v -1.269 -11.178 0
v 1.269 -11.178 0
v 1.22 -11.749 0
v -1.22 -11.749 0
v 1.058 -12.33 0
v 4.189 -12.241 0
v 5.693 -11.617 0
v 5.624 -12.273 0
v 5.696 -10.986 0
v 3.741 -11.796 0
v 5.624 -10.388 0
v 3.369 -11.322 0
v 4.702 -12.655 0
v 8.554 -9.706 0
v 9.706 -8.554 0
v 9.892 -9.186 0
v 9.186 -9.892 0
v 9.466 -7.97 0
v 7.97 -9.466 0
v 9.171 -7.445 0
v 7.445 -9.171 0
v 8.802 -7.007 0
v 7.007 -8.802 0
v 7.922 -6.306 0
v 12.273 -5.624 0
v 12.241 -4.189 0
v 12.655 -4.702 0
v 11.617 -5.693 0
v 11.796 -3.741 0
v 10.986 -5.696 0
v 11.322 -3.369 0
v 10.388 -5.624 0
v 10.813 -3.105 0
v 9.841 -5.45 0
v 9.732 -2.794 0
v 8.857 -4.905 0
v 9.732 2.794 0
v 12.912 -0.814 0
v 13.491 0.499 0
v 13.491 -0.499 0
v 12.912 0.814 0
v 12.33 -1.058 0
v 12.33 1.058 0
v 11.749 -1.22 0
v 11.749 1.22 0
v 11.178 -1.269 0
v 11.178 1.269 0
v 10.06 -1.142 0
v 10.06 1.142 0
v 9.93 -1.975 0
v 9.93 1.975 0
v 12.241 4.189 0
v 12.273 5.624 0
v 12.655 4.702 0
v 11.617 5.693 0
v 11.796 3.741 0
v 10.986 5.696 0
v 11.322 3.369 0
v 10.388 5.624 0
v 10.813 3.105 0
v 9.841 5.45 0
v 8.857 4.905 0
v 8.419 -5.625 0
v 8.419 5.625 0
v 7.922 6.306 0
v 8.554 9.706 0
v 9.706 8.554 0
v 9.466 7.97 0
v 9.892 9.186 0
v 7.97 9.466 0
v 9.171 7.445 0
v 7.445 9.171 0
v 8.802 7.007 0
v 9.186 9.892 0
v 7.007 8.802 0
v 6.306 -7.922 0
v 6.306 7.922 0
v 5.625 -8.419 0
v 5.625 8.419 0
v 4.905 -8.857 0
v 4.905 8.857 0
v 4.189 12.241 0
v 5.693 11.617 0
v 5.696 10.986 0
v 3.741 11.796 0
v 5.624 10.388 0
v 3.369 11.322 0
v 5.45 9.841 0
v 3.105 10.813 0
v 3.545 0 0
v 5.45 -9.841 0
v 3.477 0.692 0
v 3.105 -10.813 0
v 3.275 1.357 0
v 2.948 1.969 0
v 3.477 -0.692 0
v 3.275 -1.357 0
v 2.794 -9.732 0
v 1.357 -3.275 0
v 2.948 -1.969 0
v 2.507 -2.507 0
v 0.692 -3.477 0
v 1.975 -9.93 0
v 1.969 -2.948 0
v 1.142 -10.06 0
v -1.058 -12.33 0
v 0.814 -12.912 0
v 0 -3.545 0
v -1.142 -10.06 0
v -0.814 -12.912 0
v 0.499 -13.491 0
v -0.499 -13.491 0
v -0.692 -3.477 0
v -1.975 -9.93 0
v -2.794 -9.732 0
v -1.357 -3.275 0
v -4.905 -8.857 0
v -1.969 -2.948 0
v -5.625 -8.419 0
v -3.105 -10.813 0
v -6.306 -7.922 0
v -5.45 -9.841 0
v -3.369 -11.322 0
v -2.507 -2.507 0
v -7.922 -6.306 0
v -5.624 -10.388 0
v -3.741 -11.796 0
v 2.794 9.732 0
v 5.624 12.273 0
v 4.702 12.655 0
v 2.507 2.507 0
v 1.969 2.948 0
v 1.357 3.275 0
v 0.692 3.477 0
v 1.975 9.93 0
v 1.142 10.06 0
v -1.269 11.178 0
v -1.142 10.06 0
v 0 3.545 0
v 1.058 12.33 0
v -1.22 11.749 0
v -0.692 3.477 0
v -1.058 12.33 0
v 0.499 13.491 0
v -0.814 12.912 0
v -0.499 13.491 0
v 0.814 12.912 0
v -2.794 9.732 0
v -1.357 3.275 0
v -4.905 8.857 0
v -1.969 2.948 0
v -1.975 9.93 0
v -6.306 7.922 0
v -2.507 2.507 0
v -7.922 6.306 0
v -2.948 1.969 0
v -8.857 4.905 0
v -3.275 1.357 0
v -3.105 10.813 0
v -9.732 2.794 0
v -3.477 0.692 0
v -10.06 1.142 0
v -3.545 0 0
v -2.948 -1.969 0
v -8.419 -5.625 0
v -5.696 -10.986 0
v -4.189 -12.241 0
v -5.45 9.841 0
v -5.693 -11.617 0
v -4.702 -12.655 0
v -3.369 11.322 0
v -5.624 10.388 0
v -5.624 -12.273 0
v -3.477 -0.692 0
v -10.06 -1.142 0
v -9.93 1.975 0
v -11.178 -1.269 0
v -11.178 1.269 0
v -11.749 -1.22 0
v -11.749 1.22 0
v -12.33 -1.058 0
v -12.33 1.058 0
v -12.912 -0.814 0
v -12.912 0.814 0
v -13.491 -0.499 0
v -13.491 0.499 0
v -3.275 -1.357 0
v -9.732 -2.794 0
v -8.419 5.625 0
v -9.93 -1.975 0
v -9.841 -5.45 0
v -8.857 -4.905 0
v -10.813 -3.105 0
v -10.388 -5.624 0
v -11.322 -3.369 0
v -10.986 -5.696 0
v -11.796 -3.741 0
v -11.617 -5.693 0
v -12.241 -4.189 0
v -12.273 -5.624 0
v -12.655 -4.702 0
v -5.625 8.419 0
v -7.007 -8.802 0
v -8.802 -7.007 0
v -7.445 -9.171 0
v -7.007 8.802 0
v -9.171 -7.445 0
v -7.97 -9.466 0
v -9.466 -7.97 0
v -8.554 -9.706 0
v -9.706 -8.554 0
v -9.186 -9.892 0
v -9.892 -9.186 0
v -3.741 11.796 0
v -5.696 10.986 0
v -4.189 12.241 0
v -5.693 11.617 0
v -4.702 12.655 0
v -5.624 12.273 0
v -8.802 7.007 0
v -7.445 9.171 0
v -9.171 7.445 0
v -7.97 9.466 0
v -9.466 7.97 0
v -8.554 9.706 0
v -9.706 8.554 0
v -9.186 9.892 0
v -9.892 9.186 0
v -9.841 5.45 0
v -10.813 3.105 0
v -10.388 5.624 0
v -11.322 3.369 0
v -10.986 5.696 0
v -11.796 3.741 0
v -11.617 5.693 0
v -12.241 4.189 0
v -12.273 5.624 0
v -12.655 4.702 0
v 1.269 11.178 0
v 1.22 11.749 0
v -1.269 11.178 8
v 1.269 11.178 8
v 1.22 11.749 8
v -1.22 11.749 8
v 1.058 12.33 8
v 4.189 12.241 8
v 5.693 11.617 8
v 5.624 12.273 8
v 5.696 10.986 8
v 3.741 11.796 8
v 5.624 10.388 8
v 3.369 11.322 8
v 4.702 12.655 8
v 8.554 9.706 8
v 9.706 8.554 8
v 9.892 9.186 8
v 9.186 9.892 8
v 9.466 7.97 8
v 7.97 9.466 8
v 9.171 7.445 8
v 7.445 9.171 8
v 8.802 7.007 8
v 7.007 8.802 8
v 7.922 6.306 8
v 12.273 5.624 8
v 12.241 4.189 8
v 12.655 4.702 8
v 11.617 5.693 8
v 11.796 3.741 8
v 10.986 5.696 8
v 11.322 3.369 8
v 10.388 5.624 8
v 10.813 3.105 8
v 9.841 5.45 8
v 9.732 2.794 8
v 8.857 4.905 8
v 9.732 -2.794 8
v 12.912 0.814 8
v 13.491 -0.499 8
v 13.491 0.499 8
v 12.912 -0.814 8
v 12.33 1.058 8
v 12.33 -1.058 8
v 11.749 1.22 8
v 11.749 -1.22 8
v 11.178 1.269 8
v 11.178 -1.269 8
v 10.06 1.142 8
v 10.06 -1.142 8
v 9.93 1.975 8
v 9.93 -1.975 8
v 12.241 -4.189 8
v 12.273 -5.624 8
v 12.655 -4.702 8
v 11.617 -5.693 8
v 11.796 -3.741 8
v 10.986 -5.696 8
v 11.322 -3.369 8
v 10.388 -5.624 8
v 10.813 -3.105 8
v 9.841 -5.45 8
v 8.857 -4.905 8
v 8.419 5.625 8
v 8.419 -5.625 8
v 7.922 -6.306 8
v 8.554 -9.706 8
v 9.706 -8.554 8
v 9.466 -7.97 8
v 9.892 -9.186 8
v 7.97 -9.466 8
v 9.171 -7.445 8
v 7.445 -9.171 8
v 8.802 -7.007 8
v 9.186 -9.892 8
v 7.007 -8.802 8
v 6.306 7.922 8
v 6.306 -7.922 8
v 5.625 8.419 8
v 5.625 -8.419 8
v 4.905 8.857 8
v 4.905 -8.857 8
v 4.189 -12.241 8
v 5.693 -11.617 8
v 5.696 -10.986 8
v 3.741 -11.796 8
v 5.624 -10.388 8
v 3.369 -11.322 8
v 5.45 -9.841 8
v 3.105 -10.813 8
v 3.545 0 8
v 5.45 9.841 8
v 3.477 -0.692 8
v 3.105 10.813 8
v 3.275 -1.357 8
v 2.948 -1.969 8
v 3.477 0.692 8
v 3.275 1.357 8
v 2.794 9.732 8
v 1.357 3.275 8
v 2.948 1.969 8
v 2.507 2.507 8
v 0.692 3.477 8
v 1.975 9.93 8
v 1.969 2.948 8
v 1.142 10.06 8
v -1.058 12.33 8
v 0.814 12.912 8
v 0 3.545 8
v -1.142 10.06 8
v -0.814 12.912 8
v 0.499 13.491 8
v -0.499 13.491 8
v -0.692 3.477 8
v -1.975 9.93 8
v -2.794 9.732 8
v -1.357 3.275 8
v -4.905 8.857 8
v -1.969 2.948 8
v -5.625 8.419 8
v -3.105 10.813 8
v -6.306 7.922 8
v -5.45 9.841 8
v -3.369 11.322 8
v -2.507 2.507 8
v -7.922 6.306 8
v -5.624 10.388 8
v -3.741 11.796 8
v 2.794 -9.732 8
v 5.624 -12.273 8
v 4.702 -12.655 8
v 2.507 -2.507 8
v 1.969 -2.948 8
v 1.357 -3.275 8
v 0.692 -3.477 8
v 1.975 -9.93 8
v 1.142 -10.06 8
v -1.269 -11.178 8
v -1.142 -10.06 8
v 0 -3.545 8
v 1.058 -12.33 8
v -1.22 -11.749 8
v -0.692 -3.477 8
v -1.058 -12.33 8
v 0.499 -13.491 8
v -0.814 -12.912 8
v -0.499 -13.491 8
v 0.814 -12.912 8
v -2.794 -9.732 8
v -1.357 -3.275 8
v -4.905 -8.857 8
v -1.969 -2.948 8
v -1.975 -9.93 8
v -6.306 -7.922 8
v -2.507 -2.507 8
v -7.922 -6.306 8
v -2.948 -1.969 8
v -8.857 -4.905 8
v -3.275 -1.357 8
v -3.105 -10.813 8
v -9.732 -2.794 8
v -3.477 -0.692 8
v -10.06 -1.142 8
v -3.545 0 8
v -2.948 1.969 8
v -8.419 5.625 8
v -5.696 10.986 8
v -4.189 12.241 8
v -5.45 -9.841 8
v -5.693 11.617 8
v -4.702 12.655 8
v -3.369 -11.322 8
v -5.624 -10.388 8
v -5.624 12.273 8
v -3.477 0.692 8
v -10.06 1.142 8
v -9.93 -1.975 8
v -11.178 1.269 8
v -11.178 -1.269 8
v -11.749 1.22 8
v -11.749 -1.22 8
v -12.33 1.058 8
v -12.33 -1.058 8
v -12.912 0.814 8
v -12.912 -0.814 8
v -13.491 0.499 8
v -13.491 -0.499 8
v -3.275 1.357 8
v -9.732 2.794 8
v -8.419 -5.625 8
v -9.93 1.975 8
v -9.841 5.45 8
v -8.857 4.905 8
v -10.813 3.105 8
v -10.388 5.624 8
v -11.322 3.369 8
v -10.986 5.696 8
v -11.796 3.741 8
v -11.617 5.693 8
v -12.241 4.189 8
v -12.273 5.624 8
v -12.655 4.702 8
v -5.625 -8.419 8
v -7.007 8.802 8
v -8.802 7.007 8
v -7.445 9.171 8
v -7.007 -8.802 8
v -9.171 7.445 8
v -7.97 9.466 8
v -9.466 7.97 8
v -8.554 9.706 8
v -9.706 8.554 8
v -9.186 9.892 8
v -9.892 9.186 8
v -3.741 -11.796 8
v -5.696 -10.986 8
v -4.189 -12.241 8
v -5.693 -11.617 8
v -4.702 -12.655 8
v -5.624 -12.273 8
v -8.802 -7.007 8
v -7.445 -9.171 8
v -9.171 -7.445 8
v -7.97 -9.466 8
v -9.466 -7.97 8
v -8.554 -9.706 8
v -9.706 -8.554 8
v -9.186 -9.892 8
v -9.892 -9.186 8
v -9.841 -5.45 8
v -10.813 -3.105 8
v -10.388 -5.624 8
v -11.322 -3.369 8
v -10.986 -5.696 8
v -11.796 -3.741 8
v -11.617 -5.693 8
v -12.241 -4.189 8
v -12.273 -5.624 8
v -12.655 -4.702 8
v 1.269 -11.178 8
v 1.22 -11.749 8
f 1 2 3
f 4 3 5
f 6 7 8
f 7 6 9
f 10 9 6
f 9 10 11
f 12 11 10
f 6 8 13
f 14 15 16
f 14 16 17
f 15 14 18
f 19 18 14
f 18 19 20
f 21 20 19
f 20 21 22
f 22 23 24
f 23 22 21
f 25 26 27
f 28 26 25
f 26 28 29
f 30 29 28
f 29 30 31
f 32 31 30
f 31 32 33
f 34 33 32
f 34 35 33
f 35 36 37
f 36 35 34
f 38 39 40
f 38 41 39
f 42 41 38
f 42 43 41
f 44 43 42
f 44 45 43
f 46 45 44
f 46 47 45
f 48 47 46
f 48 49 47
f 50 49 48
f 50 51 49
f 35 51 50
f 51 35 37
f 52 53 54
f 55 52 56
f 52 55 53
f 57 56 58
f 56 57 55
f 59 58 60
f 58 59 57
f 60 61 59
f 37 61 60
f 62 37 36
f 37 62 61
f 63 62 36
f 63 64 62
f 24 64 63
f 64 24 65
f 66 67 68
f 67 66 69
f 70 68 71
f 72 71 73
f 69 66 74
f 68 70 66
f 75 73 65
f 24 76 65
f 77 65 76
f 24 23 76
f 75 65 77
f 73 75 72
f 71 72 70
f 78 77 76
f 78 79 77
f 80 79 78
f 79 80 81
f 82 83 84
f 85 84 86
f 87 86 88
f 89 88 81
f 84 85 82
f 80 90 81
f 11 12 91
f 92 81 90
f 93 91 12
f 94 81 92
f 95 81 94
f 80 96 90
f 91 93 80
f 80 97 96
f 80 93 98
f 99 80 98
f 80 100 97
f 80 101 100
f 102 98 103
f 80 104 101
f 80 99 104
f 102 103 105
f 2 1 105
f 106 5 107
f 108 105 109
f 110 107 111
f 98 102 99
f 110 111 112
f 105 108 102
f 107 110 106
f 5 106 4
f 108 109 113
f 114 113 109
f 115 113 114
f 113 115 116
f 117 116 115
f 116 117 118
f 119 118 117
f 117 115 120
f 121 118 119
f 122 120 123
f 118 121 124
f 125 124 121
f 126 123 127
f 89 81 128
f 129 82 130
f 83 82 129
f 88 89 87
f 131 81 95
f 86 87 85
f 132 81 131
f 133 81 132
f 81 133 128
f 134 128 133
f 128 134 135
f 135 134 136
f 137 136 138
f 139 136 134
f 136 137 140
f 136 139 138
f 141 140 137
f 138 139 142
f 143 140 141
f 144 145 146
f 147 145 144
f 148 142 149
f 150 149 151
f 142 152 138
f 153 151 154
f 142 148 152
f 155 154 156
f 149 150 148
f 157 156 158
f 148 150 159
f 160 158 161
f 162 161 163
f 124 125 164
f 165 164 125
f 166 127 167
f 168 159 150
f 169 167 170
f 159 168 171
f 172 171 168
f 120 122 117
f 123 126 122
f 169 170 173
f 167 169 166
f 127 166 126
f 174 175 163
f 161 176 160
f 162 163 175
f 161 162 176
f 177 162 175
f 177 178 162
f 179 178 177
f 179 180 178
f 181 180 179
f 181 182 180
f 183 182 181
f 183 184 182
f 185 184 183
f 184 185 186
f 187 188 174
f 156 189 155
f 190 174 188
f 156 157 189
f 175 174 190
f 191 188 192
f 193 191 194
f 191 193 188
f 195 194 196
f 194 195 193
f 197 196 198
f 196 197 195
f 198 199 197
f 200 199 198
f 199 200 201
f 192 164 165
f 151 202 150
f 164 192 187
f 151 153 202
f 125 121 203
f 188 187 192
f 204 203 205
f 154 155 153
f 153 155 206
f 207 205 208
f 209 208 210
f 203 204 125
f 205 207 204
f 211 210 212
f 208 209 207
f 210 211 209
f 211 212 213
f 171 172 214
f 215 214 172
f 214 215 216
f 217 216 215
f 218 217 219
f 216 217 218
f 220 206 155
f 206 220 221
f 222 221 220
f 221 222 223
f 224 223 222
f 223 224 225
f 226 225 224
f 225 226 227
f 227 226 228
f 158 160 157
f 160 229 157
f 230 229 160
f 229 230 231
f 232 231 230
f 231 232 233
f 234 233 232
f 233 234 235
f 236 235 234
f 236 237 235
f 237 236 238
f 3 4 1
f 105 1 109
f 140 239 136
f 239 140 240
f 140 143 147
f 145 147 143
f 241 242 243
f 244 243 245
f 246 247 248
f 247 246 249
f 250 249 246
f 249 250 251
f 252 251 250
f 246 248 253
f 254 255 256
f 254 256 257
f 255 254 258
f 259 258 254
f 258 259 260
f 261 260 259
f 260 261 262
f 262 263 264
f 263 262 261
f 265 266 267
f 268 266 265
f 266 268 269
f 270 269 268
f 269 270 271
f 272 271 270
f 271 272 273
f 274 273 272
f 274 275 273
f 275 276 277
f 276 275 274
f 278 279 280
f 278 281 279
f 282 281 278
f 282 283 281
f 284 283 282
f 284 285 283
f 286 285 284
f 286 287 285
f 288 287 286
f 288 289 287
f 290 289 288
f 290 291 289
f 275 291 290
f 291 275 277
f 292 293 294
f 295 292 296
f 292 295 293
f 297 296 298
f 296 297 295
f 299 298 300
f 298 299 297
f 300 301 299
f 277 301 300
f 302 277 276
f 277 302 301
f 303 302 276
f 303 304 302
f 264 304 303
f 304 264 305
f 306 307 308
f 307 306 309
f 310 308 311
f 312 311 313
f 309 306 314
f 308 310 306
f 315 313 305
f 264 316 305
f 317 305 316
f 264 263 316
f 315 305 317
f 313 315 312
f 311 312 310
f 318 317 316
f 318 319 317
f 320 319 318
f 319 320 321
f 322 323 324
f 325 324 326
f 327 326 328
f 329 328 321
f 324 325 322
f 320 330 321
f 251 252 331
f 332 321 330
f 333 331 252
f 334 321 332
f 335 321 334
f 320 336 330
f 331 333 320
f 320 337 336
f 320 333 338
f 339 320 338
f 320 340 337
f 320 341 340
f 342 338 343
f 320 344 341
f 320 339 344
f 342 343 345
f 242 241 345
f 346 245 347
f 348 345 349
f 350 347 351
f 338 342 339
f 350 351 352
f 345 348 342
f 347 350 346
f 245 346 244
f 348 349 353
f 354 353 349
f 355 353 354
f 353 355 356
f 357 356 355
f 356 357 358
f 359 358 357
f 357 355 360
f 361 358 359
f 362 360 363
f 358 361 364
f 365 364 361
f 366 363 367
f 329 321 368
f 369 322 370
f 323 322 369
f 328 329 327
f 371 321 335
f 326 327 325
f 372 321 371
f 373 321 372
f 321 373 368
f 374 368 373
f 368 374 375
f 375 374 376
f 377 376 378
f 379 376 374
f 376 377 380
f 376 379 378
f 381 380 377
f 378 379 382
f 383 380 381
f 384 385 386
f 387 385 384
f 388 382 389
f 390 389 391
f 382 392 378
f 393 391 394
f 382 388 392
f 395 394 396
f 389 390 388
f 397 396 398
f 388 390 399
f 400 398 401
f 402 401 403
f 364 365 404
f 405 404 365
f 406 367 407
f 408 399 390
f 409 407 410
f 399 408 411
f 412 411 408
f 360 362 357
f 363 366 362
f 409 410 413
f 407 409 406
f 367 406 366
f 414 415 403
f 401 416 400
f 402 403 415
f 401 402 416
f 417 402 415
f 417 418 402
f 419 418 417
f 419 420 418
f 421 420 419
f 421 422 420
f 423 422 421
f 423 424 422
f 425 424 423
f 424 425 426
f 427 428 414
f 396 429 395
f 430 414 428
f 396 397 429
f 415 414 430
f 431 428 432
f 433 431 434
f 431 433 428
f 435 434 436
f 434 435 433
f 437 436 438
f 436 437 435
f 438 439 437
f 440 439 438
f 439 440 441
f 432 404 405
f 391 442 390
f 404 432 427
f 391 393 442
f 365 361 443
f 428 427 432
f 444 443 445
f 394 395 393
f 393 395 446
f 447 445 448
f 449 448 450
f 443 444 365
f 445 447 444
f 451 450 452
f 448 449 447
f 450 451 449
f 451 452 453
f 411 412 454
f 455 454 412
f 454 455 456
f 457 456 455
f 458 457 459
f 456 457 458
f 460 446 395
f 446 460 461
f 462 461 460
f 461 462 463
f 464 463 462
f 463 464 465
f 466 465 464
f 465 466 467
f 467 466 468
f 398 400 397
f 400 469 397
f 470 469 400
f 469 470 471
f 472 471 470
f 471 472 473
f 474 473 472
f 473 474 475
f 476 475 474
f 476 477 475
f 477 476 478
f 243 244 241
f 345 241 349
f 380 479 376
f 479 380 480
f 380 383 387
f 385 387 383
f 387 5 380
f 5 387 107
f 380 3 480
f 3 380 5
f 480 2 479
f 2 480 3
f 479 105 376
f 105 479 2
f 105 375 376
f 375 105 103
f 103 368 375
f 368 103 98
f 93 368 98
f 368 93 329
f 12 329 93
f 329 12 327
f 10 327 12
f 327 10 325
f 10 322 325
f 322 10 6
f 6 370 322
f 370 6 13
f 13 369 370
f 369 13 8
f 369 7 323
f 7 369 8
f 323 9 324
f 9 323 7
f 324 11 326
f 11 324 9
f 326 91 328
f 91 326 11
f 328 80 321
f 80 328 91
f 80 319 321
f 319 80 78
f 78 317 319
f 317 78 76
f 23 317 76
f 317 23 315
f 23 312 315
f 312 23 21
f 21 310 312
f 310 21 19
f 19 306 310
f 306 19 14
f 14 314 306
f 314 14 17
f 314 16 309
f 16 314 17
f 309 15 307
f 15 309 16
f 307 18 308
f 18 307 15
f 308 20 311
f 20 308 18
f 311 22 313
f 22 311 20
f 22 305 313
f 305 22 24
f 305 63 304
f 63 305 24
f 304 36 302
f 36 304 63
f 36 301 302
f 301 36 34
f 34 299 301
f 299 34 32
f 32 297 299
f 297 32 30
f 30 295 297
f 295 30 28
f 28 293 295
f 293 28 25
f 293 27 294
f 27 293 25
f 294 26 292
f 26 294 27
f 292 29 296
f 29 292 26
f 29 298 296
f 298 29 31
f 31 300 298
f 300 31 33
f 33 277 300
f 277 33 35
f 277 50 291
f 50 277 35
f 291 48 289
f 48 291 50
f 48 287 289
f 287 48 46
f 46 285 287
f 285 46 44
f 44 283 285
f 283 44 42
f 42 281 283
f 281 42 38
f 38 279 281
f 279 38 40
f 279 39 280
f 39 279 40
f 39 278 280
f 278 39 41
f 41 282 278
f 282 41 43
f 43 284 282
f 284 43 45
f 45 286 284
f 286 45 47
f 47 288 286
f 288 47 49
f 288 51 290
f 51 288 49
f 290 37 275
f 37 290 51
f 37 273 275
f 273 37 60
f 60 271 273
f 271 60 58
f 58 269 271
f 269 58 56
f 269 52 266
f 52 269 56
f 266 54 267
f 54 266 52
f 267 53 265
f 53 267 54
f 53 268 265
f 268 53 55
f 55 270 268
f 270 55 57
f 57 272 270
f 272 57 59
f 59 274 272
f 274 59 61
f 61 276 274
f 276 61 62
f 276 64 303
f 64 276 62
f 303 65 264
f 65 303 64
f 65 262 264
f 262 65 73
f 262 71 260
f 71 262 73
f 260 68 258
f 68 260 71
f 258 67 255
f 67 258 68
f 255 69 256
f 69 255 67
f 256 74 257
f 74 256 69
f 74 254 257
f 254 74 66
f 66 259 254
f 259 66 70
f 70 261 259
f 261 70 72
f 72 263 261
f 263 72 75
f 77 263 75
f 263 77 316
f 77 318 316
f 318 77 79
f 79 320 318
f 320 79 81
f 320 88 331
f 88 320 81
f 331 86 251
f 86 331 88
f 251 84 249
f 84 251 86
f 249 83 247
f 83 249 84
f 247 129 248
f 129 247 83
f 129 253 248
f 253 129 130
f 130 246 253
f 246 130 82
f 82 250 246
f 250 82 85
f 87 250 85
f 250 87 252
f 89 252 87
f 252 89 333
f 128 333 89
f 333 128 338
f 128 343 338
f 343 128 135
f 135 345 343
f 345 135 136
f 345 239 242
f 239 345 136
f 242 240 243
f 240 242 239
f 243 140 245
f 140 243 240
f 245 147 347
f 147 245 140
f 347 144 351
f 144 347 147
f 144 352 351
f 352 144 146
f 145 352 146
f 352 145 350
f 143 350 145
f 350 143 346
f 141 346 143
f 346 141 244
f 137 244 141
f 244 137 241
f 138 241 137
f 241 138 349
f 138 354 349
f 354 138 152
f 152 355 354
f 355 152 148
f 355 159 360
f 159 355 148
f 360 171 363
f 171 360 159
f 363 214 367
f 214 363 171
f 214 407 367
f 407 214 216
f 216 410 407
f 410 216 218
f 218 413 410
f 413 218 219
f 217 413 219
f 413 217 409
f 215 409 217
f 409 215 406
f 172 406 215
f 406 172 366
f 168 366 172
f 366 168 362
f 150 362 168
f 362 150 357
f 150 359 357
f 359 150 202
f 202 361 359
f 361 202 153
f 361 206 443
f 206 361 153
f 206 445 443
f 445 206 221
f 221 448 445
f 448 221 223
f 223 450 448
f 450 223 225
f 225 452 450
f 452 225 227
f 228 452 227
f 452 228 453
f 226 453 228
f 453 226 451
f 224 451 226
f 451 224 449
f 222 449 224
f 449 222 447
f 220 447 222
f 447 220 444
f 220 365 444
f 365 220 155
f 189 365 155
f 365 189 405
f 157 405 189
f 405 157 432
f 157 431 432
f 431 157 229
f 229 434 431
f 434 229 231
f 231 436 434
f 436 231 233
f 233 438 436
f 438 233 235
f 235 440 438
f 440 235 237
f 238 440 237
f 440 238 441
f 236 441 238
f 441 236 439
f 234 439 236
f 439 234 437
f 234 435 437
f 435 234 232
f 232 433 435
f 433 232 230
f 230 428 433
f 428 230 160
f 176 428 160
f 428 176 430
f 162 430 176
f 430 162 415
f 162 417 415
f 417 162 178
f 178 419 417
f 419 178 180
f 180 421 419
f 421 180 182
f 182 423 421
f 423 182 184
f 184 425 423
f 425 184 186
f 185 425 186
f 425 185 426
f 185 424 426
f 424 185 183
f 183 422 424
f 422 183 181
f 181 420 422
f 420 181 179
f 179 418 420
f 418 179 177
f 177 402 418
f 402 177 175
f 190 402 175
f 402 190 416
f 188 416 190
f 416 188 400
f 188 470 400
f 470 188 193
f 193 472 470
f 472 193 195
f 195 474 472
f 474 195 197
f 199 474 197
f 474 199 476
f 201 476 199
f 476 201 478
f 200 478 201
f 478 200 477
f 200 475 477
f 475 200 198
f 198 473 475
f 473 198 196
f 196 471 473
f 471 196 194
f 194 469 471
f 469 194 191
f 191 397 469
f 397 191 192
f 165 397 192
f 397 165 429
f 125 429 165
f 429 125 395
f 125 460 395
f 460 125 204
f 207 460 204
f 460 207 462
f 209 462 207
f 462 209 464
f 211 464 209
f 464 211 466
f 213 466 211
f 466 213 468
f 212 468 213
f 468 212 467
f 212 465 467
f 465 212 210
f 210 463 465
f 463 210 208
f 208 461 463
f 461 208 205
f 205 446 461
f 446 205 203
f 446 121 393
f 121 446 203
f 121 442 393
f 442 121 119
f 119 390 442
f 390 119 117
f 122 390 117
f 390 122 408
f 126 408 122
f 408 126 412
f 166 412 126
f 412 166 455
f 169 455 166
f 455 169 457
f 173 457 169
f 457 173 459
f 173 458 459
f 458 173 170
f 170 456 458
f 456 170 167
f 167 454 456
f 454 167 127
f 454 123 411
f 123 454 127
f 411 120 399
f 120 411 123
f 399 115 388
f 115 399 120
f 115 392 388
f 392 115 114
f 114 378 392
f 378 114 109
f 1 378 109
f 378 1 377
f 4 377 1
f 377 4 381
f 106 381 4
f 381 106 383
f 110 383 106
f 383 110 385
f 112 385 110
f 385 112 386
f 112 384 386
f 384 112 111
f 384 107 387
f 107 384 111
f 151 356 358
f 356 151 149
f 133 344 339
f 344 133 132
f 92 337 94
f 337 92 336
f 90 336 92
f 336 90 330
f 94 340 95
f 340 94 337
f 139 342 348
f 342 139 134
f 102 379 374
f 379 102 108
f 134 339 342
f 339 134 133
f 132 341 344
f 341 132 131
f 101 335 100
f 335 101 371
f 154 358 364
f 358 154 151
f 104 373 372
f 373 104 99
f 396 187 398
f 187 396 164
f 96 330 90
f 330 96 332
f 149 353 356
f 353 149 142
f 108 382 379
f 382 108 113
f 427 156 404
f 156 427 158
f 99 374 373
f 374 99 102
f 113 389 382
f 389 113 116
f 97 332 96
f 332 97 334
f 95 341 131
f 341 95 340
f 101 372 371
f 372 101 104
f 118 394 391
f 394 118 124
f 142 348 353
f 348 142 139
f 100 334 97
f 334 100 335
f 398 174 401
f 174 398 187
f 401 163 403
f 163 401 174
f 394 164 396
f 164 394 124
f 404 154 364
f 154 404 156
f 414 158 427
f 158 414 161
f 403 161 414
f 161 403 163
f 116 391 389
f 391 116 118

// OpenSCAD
$fn = 32;

// ----------------------------------------------------------------------
// Spur gear: m=1.5 z=16, 27 mm tip diameter x 8 mm
// ----------------------------------------------------------------------

// --- parameters (mm) ---
modul = 1.5;              // module
n_teeth = 16;             // number of teeth
width = 8;                // face width
pa = 20;                  // pressure angle, deg
shaft_d = 7.09;           // shaft bore

/* --- involute profile --- */
pitch_r = modul * n_teeth / 2;
base_r = pitch_r * cos(pa);
tip_r = pitch_r + modul;
root_r = pitch_r - 1.25 * modul;
flank_steps = 6;

function inv_deg(a) = (tan(a) - a * PI / 180) * 180 / PI;
function flank_r(i) = root_r + (tip_r - root_r) * i / flank_steps;
function half_angle(r) = 90 / n_teeth + inv_deg(pa) - inv_deg(acos(min(1, base_r / r)));
function tooth_pt(k, i, side) =
    let (r = flank_r(i), a = k * 360 / n_teeth + side * half_angle(r))
    [r * cos(a), r * sin(a)];

module tooth_profile() {
  polygon(points = [
    for (k = [0 : n_teeth - 1])
      each [
        for (i = [0 : flank_steps]) tooth_pt(k, i, -1),
        for (i = [flank_steps : -1 : 0]) tooth_pt(k, i, 1),
        let (ta = (k + 0.5) * 360 / n_teeth)
          [root_r * cos(ta), root_r * sin(ta)]
      ]
  ]);
}

module gear_disc() {
  linear_extrude(height = width) tooth_profile();
}

difference() {
  gear_disc();
  translate([0, 0, -1]) cylinder(h = width + 3, d = shaft_d);
}
